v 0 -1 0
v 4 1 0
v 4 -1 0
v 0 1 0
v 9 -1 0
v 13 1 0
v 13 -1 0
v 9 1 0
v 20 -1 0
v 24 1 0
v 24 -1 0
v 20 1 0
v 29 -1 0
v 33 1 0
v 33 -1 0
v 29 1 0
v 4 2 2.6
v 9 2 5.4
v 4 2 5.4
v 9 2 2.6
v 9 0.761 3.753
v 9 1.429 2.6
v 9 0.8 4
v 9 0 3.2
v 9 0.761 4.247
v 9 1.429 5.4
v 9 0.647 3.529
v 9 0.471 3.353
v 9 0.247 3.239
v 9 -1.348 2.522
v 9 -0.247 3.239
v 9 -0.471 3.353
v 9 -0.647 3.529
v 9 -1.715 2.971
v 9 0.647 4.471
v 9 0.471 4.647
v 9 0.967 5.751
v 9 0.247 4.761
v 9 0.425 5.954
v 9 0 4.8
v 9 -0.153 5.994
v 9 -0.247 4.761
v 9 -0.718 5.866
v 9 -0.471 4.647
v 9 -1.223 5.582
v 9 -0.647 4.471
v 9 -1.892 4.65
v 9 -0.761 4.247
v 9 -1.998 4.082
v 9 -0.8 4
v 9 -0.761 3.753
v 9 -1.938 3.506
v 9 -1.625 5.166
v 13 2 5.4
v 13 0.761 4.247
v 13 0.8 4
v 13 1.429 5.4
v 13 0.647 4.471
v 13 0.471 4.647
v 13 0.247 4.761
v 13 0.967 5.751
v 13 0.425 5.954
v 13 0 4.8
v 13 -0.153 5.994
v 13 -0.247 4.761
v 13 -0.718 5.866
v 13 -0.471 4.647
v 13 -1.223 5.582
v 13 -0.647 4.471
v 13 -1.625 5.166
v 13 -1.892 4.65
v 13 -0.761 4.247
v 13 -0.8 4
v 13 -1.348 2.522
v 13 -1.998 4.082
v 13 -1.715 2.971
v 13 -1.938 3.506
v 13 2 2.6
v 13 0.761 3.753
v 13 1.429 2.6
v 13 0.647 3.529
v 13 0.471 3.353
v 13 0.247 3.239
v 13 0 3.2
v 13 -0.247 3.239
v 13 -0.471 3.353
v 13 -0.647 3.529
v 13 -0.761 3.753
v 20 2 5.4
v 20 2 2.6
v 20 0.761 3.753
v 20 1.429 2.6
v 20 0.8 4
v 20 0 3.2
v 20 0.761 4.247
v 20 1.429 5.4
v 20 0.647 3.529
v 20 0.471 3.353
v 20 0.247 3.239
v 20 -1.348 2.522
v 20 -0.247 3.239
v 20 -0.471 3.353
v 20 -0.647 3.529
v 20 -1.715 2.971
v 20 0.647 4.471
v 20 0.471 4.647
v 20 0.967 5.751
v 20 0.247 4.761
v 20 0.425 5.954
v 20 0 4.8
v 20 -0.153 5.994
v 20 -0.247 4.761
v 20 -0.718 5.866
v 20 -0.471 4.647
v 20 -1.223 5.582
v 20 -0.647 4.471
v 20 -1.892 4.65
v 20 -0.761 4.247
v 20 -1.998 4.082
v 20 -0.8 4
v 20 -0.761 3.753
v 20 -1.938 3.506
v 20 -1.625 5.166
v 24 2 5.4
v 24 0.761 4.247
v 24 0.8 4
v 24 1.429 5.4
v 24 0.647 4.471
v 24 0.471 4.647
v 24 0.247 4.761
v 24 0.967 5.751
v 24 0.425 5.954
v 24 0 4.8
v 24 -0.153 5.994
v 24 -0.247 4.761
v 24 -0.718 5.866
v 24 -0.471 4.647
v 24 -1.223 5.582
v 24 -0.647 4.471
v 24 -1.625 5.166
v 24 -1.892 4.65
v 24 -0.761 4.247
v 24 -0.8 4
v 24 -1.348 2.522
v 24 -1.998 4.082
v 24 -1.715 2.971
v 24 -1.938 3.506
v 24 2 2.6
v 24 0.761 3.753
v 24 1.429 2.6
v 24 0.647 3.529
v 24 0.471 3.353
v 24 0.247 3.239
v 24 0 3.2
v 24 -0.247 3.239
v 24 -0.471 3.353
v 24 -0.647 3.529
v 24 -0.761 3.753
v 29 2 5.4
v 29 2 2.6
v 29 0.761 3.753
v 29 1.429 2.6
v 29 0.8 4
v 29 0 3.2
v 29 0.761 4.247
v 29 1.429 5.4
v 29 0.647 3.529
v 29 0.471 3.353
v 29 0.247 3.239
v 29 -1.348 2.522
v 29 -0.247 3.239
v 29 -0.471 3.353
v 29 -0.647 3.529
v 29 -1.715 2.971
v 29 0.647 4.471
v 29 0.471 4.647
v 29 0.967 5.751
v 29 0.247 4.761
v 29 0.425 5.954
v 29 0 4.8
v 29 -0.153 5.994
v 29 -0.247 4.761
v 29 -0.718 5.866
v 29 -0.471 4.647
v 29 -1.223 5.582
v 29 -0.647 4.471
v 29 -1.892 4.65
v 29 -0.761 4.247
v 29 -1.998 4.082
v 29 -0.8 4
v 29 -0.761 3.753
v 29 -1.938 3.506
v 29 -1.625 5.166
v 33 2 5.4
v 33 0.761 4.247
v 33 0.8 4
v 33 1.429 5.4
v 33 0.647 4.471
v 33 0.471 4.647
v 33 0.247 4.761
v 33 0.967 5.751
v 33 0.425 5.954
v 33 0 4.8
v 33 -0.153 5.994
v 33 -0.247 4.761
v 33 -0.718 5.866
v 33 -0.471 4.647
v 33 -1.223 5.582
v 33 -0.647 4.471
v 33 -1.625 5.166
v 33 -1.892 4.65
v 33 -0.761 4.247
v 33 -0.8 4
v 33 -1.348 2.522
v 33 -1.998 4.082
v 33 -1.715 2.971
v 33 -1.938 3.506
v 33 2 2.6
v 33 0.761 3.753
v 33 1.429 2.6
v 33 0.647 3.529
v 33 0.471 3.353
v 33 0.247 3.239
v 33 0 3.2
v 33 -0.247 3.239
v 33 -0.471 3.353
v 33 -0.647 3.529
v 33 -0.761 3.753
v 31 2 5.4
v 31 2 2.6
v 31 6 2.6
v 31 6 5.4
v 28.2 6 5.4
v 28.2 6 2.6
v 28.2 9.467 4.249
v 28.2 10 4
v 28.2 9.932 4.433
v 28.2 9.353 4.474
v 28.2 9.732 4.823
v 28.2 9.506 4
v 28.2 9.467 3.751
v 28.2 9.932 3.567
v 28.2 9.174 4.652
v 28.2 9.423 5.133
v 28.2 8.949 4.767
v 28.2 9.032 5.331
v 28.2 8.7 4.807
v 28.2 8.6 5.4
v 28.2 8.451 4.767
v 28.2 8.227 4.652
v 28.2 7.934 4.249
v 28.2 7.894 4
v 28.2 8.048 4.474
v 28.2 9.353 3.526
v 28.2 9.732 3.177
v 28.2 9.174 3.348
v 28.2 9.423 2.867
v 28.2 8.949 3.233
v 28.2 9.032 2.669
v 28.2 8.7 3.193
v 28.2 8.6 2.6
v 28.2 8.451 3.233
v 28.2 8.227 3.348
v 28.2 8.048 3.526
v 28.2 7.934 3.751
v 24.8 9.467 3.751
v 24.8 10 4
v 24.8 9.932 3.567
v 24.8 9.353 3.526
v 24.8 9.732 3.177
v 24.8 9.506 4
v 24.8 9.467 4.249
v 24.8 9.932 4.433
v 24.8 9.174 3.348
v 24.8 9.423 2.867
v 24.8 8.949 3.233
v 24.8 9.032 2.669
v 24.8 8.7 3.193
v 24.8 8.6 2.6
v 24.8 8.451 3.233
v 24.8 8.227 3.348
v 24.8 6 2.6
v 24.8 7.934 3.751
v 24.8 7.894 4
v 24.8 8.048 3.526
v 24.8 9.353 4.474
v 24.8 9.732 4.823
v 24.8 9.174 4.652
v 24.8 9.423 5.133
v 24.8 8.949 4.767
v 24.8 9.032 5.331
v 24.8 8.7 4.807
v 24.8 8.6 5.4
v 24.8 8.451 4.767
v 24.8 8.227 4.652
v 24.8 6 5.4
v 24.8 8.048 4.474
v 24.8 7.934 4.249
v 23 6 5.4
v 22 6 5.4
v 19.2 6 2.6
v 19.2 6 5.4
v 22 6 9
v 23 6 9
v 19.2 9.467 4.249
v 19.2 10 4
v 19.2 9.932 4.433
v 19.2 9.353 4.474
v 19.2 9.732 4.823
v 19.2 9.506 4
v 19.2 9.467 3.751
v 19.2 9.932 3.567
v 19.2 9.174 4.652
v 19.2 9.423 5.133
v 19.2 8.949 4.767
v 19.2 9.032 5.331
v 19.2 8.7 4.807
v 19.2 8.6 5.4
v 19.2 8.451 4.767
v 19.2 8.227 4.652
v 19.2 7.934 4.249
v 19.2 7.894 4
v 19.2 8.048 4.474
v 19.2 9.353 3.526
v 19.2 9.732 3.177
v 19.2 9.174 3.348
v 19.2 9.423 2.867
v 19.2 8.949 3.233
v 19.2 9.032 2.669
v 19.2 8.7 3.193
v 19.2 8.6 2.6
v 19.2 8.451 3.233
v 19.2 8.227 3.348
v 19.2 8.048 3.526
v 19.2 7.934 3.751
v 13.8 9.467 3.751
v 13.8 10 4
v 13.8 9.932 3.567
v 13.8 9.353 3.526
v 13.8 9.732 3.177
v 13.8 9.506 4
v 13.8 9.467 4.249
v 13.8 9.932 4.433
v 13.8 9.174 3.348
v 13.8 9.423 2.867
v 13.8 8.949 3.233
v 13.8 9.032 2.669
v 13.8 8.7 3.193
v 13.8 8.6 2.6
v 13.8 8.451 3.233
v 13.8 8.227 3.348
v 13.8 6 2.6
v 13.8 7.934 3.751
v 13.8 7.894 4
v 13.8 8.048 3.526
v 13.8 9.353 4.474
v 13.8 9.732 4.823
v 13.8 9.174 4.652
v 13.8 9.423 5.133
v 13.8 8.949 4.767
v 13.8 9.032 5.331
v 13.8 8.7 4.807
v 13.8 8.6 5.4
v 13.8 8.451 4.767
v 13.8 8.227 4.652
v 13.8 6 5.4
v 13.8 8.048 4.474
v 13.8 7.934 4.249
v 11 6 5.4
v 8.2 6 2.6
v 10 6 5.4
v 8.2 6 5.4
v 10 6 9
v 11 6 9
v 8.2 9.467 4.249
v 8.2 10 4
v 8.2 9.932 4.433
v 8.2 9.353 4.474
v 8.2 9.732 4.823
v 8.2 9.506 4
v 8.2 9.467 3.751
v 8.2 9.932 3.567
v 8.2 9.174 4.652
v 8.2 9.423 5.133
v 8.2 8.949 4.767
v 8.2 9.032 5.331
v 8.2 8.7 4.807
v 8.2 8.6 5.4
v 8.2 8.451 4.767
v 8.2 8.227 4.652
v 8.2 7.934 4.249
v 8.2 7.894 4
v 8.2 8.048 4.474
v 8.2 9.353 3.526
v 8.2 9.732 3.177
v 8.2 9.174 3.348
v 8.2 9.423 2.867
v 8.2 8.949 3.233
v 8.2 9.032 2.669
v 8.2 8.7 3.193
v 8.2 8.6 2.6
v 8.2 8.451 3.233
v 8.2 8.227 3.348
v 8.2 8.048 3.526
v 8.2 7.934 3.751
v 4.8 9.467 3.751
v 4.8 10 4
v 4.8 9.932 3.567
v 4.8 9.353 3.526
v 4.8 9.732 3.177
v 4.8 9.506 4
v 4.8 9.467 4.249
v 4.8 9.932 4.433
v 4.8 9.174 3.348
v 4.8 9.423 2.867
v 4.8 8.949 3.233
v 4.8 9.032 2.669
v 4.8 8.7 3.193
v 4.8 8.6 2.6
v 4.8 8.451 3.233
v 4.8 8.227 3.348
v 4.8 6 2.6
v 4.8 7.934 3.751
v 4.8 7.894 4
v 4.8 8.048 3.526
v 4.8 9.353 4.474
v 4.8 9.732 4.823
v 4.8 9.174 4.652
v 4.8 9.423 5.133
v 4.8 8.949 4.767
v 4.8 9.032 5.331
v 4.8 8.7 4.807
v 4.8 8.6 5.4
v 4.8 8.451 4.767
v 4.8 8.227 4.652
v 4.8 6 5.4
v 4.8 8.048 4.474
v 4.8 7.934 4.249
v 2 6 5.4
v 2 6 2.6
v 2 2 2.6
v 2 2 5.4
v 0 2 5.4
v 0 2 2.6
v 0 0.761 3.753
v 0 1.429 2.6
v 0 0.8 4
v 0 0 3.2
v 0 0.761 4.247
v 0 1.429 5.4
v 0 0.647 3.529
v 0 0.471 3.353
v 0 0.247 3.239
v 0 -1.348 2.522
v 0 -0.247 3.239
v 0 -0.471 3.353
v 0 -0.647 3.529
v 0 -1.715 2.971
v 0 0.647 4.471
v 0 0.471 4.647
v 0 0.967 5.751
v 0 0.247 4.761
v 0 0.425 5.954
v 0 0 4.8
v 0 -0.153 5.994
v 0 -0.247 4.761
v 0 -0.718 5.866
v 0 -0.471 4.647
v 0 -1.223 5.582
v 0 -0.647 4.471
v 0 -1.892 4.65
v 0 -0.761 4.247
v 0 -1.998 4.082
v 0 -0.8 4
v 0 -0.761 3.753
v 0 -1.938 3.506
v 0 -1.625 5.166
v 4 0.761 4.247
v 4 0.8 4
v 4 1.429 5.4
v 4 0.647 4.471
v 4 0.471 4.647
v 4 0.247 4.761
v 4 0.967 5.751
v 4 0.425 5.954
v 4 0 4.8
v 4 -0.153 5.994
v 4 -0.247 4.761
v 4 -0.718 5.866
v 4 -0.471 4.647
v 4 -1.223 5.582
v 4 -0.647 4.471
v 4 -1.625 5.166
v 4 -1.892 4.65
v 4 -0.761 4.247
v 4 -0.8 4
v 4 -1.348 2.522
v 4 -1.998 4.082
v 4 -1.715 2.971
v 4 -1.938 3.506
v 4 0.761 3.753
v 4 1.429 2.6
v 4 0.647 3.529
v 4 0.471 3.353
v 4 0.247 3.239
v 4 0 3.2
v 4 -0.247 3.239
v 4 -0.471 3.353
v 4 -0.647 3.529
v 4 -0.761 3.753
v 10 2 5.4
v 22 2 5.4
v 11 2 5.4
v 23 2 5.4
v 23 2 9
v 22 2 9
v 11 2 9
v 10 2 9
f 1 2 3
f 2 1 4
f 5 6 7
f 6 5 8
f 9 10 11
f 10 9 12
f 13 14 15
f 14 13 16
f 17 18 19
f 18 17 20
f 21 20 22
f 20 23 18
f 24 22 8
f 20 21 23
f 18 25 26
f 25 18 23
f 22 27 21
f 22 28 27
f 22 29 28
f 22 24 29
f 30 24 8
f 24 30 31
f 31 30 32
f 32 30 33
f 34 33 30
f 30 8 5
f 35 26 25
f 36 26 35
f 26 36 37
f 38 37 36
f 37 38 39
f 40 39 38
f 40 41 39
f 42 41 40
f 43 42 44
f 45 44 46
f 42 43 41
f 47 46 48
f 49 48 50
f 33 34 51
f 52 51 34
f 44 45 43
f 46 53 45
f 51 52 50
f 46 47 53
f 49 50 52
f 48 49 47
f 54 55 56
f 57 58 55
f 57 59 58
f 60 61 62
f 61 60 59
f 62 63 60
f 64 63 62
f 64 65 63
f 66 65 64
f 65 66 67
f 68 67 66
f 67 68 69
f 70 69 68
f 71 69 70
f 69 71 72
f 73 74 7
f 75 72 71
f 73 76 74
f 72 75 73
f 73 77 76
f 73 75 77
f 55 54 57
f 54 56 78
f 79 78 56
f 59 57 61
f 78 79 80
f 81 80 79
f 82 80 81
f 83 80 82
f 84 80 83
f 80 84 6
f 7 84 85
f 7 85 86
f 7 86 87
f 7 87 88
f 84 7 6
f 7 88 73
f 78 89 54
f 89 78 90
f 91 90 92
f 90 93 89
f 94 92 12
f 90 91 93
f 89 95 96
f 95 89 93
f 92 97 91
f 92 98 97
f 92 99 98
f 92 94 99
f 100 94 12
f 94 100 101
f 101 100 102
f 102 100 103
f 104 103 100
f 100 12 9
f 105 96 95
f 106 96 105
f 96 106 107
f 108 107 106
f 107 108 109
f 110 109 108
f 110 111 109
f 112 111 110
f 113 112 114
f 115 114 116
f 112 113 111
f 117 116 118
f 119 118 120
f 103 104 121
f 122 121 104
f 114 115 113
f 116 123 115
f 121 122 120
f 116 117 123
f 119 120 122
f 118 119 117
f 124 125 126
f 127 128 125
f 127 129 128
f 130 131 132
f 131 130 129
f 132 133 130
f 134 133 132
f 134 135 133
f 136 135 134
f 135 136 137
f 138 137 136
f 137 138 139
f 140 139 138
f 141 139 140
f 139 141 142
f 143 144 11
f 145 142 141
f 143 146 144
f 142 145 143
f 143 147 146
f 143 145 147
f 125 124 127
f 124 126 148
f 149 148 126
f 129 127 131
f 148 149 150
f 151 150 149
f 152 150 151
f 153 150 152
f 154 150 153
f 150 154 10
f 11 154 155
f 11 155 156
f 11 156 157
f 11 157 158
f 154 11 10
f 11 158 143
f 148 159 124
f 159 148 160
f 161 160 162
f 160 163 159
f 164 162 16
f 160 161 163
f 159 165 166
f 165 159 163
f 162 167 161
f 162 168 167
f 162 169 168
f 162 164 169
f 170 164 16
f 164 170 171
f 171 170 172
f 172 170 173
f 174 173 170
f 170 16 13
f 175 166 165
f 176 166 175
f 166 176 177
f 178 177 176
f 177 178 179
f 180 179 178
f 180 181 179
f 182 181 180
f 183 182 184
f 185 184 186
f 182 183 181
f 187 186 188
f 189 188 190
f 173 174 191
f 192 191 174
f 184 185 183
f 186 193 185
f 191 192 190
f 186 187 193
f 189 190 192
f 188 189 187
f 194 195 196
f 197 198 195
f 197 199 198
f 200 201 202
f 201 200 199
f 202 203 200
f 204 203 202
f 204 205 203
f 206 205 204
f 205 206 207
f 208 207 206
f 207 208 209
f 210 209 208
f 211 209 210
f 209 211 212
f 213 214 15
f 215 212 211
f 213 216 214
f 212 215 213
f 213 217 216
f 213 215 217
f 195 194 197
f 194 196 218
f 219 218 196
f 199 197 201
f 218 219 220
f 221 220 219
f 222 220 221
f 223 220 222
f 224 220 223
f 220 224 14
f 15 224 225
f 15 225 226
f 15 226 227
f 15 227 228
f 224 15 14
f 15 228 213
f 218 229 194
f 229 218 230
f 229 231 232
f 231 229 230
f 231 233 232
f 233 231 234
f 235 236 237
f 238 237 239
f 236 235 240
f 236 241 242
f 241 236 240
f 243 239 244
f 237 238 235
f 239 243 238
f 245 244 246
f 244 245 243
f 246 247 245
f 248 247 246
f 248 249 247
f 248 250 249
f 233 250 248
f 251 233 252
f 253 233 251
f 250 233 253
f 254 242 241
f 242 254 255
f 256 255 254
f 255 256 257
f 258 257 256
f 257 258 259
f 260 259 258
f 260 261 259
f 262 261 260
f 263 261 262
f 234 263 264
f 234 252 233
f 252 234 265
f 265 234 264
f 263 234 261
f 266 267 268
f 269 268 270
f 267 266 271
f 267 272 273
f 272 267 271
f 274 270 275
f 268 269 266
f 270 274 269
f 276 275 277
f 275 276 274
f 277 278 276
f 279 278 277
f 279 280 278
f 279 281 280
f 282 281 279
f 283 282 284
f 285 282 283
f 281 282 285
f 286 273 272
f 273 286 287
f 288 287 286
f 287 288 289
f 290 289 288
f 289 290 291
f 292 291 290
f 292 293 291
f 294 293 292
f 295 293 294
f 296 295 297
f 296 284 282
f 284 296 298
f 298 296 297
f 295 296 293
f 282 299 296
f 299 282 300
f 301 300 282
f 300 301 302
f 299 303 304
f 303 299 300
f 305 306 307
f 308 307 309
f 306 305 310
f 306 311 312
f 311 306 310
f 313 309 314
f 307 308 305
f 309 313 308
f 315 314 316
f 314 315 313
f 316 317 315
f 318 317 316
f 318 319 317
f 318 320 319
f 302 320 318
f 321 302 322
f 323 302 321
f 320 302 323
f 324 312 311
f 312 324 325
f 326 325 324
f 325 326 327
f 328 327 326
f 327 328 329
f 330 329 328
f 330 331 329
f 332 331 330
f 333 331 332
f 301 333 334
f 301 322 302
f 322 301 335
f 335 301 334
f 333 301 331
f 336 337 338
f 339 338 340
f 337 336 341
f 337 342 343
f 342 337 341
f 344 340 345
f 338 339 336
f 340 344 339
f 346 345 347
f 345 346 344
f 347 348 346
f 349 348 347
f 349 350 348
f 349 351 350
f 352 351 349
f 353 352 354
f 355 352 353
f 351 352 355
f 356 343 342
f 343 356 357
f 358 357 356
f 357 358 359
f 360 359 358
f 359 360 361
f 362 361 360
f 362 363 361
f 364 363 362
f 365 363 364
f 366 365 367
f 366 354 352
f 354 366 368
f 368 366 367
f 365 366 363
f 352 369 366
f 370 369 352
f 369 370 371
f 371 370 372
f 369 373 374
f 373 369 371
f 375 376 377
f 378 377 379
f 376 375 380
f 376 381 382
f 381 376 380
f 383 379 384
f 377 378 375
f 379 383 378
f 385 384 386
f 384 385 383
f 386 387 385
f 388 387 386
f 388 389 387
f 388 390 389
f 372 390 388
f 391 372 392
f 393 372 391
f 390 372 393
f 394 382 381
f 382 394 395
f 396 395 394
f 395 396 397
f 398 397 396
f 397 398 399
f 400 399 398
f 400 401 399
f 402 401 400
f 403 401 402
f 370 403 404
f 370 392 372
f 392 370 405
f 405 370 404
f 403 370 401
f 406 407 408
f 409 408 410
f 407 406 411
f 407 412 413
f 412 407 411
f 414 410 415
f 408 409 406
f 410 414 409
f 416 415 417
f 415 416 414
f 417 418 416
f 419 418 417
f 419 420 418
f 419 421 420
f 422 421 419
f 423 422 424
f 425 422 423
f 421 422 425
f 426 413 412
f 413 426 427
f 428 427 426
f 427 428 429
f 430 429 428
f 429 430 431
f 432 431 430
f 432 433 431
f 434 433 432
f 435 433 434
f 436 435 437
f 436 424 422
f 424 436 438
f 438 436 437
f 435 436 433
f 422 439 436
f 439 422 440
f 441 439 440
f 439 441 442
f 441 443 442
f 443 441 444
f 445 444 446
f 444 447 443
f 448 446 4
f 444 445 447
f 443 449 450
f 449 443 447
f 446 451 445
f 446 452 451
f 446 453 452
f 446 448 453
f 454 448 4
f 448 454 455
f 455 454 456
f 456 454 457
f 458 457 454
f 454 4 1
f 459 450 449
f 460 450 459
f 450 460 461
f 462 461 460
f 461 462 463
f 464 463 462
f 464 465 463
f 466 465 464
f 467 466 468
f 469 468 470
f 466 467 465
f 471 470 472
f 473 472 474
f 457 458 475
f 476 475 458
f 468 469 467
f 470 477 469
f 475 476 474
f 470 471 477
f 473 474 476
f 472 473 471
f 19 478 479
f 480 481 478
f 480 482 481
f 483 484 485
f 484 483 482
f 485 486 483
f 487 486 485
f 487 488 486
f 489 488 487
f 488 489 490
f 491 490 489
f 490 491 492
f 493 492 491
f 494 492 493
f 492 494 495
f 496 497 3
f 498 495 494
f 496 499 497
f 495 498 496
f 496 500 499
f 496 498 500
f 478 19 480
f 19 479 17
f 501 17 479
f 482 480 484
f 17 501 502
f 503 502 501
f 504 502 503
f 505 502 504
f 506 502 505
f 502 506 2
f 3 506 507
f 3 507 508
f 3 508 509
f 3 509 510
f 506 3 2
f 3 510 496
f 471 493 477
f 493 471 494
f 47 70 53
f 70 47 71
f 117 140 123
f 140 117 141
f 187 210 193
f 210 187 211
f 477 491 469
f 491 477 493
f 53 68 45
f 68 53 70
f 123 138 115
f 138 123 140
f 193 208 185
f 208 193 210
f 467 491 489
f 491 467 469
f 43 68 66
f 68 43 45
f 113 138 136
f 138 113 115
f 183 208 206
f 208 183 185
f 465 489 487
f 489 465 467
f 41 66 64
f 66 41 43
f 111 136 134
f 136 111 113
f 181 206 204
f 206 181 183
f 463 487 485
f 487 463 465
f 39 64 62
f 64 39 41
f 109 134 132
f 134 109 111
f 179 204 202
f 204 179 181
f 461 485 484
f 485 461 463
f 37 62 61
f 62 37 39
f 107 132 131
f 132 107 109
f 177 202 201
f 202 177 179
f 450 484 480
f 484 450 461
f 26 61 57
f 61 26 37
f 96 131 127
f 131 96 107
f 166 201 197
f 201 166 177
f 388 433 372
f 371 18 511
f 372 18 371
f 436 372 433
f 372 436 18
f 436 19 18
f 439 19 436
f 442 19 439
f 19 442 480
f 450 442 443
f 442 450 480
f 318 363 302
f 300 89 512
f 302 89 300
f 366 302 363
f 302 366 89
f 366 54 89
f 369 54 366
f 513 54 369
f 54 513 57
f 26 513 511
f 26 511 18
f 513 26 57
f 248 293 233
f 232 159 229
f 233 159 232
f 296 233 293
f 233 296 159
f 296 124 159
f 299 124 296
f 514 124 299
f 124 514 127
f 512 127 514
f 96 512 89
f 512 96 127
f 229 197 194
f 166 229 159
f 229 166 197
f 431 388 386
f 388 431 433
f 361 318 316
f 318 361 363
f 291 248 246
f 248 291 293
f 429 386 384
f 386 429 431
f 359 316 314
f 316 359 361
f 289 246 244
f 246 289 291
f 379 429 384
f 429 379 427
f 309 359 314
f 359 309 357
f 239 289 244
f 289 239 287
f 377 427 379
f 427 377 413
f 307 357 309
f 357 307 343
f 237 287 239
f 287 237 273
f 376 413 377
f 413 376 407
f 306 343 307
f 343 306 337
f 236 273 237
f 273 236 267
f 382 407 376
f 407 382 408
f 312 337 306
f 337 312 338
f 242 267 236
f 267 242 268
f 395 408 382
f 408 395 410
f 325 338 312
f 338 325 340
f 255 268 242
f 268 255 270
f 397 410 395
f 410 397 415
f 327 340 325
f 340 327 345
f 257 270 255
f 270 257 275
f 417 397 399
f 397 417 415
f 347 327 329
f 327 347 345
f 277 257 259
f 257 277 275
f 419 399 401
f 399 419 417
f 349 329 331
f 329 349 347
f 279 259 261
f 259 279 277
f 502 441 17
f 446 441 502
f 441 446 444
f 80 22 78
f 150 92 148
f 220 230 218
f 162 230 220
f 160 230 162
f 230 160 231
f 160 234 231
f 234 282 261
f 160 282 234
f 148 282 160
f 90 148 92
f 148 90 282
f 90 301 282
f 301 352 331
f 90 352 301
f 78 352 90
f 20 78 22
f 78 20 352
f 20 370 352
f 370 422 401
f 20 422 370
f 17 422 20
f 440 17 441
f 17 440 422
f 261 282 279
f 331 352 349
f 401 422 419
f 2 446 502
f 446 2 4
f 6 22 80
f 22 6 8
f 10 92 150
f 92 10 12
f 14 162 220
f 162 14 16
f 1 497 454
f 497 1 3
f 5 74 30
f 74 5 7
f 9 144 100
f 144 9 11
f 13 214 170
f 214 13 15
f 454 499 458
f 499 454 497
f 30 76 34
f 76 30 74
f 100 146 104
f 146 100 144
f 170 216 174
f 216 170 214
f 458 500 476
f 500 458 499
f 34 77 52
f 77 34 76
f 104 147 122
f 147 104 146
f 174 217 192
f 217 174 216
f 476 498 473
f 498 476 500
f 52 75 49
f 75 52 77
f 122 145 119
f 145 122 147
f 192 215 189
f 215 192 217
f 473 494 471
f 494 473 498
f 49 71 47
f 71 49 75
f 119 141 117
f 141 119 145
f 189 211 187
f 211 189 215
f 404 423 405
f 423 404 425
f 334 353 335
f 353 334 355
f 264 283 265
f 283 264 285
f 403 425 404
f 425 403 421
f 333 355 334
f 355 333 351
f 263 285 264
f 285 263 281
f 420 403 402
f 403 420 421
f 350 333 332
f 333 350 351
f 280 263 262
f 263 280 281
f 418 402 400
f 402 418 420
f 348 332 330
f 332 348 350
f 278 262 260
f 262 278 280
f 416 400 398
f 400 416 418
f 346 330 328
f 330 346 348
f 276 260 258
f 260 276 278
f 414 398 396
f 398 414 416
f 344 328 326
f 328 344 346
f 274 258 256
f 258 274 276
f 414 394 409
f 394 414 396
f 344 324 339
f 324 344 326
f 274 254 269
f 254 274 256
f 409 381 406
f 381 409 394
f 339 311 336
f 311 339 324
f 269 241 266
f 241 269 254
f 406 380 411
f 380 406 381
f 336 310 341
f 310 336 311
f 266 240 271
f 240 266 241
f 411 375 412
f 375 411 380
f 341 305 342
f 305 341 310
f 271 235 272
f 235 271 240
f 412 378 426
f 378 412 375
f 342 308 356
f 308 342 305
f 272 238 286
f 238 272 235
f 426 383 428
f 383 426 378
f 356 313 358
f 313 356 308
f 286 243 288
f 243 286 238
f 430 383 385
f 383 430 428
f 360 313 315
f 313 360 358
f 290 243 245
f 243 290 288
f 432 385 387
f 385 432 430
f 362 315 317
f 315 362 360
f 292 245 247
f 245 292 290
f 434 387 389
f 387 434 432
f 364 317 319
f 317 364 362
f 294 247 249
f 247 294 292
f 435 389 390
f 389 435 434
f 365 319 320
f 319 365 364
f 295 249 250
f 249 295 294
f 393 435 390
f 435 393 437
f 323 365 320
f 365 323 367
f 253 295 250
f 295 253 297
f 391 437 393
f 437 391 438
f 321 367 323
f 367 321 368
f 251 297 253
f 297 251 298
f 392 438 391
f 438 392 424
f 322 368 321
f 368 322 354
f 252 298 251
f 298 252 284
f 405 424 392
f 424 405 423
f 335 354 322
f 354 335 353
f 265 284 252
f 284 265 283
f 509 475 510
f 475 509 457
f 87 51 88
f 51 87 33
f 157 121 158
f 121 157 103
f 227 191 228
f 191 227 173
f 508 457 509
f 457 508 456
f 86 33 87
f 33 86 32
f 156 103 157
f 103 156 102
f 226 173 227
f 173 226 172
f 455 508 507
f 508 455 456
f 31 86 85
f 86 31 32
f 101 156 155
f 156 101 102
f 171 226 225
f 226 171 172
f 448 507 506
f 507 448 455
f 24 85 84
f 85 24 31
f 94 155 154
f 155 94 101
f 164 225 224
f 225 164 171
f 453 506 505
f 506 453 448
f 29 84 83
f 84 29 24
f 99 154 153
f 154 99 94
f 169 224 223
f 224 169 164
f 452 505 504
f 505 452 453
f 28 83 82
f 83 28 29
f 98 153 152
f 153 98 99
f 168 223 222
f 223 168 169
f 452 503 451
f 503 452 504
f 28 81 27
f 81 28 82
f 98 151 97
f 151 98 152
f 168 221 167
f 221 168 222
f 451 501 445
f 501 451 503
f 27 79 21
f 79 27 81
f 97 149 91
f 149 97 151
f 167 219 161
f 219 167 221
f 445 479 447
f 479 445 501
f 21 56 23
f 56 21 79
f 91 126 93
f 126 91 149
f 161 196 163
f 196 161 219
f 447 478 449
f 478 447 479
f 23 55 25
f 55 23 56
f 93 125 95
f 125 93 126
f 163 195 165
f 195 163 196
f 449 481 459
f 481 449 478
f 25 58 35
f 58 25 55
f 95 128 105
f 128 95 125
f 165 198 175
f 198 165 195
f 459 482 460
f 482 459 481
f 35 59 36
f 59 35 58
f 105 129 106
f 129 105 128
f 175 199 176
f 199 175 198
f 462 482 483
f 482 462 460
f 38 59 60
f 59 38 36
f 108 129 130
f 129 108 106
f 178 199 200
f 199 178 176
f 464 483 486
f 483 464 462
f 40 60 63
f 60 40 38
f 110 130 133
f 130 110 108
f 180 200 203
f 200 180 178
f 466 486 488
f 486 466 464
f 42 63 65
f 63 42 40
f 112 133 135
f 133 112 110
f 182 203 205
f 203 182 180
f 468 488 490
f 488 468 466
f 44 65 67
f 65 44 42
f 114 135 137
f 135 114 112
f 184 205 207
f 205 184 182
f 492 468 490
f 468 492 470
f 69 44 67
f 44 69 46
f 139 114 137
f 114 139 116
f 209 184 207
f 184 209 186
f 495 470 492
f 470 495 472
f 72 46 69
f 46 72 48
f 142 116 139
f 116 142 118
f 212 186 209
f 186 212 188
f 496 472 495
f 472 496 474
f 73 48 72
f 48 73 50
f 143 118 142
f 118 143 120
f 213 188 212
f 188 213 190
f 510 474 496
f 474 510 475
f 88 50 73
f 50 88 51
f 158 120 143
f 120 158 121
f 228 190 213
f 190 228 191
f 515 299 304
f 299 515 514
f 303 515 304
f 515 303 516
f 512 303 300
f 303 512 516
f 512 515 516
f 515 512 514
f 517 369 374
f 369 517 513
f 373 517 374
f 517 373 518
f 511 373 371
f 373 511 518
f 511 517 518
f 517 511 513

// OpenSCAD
intersection(){
linear_extrude(6)	import("../dxf/Tiger520mm.dxf", $fn=20);

translate([34,0,4]) rotate([0,-90,0])
color("green")
linear_extrude(35)	import("../dxf/Tiger520mm_side.dxf", $fn=20);

}

translate([22,2,5])
scale([1,4,4])
cube(1);

translate([10,2,5])
scale([1,4,4])
cube(1);
//translate([0,-2,-40]) rotate([-90,0,0])
//color("blue")
//linear_extrude(12)	import("../dxf/Tiger520mm_front.dxf", $fn=20);
